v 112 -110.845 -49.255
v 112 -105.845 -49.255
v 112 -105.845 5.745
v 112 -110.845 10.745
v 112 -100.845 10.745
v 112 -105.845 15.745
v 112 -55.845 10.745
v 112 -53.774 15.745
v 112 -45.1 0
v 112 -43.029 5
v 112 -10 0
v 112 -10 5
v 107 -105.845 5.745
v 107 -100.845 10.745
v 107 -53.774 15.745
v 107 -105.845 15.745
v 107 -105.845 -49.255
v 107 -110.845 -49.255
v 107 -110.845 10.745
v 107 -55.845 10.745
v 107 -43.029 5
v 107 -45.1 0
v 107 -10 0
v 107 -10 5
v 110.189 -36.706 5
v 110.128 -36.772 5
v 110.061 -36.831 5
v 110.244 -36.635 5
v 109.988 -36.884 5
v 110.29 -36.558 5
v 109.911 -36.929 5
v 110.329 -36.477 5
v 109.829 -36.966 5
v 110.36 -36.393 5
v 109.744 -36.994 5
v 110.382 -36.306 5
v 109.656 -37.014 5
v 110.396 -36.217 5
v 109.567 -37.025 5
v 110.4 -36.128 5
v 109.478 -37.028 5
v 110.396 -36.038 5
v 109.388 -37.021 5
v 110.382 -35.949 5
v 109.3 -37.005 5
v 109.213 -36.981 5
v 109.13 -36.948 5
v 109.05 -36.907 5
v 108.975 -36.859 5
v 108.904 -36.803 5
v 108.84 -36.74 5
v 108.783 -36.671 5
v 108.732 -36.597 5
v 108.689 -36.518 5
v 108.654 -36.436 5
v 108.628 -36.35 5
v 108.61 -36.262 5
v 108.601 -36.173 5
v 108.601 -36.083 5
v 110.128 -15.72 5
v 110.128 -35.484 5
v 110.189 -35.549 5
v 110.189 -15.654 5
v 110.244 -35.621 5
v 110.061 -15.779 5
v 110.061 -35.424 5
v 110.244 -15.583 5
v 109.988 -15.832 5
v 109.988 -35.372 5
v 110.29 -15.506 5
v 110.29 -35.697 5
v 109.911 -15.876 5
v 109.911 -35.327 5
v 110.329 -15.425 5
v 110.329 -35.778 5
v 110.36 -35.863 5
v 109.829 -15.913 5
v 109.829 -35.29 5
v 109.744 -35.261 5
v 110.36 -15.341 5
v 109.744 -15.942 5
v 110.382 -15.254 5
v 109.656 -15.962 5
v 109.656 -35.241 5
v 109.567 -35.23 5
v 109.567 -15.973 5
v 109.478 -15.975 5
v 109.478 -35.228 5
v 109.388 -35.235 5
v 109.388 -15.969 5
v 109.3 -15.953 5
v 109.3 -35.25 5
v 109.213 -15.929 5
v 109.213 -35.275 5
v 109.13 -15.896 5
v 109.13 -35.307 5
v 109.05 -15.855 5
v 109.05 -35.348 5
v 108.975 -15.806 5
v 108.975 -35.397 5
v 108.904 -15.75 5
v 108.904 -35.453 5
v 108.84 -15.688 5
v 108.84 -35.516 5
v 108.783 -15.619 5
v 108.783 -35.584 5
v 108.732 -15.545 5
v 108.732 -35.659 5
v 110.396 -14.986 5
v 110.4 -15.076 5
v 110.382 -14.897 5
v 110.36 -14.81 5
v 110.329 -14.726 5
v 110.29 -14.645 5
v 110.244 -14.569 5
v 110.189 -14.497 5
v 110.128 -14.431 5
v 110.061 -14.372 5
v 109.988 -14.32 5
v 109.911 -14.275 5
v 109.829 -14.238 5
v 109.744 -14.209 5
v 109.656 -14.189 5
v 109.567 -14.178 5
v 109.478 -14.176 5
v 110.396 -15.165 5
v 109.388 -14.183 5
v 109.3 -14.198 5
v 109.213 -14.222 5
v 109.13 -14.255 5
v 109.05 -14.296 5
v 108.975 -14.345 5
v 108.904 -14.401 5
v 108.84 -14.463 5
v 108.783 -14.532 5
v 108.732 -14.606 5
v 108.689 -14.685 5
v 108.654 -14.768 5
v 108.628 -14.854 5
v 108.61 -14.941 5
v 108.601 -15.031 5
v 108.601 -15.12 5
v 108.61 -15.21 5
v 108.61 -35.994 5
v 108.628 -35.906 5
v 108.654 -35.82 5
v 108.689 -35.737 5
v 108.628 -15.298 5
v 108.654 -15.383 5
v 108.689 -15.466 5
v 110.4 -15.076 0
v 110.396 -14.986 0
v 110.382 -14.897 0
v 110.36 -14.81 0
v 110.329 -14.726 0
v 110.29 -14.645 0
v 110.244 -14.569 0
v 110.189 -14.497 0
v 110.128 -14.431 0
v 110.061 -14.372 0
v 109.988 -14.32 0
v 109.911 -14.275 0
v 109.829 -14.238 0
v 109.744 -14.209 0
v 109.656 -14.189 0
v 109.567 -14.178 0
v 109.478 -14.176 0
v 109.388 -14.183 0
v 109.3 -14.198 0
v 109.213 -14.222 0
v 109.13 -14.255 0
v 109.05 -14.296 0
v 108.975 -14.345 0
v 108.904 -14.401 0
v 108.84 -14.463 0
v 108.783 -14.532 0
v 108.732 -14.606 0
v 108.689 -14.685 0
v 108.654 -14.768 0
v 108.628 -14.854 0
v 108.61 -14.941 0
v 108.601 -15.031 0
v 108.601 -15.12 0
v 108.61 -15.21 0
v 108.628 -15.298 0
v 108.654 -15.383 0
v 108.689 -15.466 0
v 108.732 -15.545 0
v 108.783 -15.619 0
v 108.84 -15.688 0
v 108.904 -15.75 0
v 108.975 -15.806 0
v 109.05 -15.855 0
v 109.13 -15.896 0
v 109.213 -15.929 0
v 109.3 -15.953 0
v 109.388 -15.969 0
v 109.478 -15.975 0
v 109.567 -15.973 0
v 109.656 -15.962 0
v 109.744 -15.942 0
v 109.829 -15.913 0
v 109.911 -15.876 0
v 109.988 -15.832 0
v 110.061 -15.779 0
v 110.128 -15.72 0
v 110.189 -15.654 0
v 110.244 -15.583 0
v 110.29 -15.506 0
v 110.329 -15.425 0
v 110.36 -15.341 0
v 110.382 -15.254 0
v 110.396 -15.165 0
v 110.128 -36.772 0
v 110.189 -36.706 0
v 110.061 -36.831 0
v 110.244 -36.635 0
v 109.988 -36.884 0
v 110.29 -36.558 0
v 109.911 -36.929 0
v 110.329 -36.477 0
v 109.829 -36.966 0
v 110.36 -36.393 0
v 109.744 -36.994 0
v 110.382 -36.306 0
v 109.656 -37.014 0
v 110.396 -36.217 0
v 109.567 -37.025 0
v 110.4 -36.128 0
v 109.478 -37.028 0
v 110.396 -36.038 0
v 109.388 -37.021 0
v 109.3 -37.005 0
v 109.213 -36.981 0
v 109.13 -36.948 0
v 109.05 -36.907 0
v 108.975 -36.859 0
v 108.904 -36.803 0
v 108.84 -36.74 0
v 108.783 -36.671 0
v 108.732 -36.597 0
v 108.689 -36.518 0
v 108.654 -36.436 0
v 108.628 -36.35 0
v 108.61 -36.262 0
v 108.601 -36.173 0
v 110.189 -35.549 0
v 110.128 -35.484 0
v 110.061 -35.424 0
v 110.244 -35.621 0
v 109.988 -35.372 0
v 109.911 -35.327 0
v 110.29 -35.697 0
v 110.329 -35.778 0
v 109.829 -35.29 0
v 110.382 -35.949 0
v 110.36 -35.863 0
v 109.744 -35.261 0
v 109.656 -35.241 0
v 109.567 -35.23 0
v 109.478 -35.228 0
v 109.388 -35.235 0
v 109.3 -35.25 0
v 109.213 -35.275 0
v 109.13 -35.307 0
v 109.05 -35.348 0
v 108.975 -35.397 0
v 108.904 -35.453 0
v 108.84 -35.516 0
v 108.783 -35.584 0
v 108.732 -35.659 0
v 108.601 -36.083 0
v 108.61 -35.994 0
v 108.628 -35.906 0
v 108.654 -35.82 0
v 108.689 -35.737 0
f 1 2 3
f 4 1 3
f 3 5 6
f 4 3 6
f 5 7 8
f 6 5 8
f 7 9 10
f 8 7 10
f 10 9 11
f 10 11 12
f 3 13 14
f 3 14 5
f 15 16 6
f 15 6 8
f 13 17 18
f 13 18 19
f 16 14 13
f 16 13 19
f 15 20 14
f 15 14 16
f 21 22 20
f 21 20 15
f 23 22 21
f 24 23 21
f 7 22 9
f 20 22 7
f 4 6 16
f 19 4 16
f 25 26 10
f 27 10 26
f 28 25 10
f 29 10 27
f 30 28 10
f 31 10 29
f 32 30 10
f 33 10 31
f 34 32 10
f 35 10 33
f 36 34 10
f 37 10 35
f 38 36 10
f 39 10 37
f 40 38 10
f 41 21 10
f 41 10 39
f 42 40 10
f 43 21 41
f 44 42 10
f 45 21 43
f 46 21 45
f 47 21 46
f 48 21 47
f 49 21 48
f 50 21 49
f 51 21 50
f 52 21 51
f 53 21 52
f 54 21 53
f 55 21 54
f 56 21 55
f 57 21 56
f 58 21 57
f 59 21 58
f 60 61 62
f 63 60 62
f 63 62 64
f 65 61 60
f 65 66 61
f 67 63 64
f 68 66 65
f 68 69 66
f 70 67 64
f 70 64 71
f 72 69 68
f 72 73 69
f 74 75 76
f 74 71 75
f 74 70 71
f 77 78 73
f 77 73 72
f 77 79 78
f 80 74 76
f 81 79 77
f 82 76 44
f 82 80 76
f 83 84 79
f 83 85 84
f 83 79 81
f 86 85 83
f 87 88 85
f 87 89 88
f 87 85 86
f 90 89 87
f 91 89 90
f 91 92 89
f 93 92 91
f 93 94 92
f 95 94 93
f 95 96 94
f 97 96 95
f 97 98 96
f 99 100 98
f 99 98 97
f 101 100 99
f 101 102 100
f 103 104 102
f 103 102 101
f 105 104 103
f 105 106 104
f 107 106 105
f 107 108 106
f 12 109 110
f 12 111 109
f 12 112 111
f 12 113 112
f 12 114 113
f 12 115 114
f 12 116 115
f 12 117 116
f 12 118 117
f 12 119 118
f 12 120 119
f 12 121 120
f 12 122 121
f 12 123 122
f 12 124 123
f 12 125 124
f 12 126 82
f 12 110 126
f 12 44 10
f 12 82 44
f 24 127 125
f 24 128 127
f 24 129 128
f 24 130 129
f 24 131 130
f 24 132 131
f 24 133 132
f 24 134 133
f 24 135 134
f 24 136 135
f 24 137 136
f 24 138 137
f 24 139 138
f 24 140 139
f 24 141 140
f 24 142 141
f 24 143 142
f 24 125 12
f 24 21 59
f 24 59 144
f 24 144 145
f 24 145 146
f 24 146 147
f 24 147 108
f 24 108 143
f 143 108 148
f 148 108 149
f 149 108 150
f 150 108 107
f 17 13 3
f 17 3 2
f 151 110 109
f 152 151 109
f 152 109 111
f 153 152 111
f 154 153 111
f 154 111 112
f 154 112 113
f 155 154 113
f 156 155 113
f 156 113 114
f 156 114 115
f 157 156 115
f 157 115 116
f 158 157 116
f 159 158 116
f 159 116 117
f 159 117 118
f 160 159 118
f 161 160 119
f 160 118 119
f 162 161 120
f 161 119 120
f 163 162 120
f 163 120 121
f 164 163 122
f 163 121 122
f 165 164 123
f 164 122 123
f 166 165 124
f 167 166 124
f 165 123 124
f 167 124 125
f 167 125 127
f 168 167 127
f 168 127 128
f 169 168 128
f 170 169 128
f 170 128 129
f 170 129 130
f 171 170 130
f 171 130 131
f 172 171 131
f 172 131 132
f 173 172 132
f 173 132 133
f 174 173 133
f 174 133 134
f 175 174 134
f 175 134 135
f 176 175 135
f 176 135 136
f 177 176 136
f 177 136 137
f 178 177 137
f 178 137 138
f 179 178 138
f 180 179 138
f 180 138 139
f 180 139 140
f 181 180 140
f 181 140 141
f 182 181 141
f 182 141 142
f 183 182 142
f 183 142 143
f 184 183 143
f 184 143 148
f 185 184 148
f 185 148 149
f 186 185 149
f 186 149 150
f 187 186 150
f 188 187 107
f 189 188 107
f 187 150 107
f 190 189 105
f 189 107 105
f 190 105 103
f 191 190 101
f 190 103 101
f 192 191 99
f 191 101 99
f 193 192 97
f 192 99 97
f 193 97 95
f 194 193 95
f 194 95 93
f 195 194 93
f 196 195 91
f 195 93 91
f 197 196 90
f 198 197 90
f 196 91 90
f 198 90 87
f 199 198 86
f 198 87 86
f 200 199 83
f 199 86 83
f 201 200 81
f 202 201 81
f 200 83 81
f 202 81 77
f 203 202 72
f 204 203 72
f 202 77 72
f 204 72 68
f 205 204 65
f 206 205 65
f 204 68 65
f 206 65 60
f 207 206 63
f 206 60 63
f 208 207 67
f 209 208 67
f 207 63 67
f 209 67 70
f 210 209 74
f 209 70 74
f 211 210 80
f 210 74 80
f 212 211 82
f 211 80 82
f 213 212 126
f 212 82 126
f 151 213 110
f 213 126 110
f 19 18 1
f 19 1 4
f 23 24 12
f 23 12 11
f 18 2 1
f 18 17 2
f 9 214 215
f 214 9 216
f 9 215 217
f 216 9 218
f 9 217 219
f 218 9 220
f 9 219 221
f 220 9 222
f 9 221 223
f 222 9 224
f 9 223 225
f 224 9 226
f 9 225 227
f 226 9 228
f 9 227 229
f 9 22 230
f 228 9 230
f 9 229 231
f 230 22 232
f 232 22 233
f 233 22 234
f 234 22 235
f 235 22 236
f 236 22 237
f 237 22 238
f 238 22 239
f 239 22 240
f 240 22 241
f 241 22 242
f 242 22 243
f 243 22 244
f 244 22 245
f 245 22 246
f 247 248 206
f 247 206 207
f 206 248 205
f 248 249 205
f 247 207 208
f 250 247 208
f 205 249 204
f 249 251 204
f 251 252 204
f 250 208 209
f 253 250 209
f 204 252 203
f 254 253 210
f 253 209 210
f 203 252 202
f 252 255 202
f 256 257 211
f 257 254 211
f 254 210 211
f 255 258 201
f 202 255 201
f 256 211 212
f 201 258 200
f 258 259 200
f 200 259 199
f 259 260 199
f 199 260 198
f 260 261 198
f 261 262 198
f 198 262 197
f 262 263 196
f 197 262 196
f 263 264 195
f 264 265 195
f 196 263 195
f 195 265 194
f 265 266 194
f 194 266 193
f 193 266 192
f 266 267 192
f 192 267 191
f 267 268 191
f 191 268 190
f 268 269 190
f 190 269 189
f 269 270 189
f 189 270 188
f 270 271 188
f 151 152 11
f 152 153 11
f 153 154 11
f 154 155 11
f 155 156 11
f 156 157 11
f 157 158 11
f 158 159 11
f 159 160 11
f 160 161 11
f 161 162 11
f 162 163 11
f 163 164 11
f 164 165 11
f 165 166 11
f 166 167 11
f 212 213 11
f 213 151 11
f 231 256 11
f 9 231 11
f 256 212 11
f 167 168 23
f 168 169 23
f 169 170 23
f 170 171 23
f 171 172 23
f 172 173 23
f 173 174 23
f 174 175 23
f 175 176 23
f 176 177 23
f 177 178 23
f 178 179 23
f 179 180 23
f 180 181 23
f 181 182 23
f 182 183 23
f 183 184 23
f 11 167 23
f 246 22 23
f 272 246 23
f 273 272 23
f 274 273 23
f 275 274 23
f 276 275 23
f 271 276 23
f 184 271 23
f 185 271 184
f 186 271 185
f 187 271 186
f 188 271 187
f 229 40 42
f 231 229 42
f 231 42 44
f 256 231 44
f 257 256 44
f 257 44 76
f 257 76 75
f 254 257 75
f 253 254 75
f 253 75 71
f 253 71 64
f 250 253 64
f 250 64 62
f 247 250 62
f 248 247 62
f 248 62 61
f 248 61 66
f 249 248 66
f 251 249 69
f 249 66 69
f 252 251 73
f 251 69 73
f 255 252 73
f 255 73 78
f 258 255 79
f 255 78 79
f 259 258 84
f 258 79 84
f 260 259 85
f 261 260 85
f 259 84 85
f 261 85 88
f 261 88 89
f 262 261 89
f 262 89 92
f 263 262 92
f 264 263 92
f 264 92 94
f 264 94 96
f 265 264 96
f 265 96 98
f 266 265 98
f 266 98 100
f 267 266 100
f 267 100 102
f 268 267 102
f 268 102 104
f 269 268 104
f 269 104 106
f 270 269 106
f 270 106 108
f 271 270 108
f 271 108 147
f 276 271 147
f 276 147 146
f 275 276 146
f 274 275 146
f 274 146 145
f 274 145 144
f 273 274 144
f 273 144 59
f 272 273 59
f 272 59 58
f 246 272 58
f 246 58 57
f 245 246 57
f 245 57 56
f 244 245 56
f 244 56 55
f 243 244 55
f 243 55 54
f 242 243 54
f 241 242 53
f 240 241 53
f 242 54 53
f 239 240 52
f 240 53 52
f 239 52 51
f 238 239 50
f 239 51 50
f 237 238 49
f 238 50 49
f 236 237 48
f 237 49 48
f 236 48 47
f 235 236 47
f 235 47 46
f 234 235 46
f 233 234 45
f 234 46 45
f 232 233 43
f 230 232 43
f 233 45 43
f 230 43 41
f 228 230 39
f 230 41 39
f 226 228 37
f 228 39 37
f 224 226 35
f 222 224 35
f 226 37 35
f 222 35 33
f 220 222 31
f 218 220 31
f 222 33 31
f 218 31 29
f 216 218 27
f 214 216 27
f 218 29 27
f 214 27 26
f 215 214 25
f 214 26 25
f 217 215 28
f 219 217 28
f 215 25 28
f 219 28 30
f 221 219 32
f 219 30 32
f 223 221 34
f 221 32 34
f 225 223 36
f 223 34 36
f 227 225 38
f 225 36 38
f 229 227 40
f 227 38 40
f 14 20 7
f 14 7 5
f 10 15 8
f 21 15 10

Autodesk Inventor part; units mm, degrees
ref_plane "YZ Plane" through (0, 0, 0) normal (1, 0, 0) x (0, 1, 0)
ref_plane "XZ Plane" through (0, 0, 0) normal (0, 1, 0) x (-1, 0, 0)
ref_plane "XY Plane" through (0, 0, 0) normal (0, 0, 1) x (1, 0, 0)
ref_plane "Arbeitsebene1" through (107, -8, 0) normal (-1, 0, 0) x (0, 0, 1)
sketch "Skizze1" plane through (107, -8, 0) normal (-1, 0, 0) x (0, 0, 1)
  line L0 (-4.1, -2) -> (-4.1, -37.1) projected
  line L1 (0, -2) -> (-4.1, -2) projected
  line L2 (0, -37.1) -> (0, -2) projected
  line L3 (0, -37.1) -> (-4.1, -37.1) projected
  line L4 (0, -37.1) -> (10.7454, -47.8454)
  line L5 (0, -37.1) -> (15.1963, -37.1) construction
  line L6 (10.7454, -47.8454) -> (10.7454, -97.8454)
  line L7 (10.7454, -97.8454) -> (-49.2546, -97.8454)
  line L8 (-49.2546, -97.8454) -> (-49.2546, -102.8454)
  line L9 (-49.2546, -102.8454) -> (15.7454, -102.8454)
  line L10 (15.7454, -102.8454) -> (15.7454, -45.7743)
  line L11 (15.7454, -45.7743) -> (5, -35.0289)
  line L12 (5, -35.0289) -> (5, -2)
  line L13 (5, -2) -> (0, -2)
  line L14 (0, -37.1) -> (0, -2)
  point P0 (0, 8)
  dimension "d0" = 45
  dimension "d1" = 5
  dimension "d2" = 5
  dimension "d3" = 5
  dimension "d4" = 5
  dimension "d5" = 60
  dimension "d6" = 50
extrude "Extrusion1" add sketch "Skizze1" against normal blind 5 contours L13 L12 L11 L10 L9 L8 L7 L6 L4 L2
sketch "Skizze2" plane through (107, -43.0289, 5) normal (0, 0, 1) x (1, 0, 0)
  line L0 (0, 0) -> (0, 33.0289) projected
  line L1 (0, 0) -> (5, 0) projected
  line L2 (5, 33.0289) -> (5, 0) projected
  line L3 (0, 33.0289) -> (5, 33.0289) projected
  circle A0 centre (2.5, 27.9533) radius 0.9
  circle A1 centre (2.5, 6.9011) radius 0.9
  point P0 (-107, 43.0289)
  dimension "d9" = 1.8
  dimension "d10" = 1.8
extrude "Extrusion2" cut sketch "Skizze2" against normal through all contours A0 | A1
chamfer "Fase1" distance 5 angle 45 2 edges at (109.5, -110.8454, 15.7454) (109.5, -105.8454, 10.7454)
properties part number "07_Omnivision_Lamp_arm"
